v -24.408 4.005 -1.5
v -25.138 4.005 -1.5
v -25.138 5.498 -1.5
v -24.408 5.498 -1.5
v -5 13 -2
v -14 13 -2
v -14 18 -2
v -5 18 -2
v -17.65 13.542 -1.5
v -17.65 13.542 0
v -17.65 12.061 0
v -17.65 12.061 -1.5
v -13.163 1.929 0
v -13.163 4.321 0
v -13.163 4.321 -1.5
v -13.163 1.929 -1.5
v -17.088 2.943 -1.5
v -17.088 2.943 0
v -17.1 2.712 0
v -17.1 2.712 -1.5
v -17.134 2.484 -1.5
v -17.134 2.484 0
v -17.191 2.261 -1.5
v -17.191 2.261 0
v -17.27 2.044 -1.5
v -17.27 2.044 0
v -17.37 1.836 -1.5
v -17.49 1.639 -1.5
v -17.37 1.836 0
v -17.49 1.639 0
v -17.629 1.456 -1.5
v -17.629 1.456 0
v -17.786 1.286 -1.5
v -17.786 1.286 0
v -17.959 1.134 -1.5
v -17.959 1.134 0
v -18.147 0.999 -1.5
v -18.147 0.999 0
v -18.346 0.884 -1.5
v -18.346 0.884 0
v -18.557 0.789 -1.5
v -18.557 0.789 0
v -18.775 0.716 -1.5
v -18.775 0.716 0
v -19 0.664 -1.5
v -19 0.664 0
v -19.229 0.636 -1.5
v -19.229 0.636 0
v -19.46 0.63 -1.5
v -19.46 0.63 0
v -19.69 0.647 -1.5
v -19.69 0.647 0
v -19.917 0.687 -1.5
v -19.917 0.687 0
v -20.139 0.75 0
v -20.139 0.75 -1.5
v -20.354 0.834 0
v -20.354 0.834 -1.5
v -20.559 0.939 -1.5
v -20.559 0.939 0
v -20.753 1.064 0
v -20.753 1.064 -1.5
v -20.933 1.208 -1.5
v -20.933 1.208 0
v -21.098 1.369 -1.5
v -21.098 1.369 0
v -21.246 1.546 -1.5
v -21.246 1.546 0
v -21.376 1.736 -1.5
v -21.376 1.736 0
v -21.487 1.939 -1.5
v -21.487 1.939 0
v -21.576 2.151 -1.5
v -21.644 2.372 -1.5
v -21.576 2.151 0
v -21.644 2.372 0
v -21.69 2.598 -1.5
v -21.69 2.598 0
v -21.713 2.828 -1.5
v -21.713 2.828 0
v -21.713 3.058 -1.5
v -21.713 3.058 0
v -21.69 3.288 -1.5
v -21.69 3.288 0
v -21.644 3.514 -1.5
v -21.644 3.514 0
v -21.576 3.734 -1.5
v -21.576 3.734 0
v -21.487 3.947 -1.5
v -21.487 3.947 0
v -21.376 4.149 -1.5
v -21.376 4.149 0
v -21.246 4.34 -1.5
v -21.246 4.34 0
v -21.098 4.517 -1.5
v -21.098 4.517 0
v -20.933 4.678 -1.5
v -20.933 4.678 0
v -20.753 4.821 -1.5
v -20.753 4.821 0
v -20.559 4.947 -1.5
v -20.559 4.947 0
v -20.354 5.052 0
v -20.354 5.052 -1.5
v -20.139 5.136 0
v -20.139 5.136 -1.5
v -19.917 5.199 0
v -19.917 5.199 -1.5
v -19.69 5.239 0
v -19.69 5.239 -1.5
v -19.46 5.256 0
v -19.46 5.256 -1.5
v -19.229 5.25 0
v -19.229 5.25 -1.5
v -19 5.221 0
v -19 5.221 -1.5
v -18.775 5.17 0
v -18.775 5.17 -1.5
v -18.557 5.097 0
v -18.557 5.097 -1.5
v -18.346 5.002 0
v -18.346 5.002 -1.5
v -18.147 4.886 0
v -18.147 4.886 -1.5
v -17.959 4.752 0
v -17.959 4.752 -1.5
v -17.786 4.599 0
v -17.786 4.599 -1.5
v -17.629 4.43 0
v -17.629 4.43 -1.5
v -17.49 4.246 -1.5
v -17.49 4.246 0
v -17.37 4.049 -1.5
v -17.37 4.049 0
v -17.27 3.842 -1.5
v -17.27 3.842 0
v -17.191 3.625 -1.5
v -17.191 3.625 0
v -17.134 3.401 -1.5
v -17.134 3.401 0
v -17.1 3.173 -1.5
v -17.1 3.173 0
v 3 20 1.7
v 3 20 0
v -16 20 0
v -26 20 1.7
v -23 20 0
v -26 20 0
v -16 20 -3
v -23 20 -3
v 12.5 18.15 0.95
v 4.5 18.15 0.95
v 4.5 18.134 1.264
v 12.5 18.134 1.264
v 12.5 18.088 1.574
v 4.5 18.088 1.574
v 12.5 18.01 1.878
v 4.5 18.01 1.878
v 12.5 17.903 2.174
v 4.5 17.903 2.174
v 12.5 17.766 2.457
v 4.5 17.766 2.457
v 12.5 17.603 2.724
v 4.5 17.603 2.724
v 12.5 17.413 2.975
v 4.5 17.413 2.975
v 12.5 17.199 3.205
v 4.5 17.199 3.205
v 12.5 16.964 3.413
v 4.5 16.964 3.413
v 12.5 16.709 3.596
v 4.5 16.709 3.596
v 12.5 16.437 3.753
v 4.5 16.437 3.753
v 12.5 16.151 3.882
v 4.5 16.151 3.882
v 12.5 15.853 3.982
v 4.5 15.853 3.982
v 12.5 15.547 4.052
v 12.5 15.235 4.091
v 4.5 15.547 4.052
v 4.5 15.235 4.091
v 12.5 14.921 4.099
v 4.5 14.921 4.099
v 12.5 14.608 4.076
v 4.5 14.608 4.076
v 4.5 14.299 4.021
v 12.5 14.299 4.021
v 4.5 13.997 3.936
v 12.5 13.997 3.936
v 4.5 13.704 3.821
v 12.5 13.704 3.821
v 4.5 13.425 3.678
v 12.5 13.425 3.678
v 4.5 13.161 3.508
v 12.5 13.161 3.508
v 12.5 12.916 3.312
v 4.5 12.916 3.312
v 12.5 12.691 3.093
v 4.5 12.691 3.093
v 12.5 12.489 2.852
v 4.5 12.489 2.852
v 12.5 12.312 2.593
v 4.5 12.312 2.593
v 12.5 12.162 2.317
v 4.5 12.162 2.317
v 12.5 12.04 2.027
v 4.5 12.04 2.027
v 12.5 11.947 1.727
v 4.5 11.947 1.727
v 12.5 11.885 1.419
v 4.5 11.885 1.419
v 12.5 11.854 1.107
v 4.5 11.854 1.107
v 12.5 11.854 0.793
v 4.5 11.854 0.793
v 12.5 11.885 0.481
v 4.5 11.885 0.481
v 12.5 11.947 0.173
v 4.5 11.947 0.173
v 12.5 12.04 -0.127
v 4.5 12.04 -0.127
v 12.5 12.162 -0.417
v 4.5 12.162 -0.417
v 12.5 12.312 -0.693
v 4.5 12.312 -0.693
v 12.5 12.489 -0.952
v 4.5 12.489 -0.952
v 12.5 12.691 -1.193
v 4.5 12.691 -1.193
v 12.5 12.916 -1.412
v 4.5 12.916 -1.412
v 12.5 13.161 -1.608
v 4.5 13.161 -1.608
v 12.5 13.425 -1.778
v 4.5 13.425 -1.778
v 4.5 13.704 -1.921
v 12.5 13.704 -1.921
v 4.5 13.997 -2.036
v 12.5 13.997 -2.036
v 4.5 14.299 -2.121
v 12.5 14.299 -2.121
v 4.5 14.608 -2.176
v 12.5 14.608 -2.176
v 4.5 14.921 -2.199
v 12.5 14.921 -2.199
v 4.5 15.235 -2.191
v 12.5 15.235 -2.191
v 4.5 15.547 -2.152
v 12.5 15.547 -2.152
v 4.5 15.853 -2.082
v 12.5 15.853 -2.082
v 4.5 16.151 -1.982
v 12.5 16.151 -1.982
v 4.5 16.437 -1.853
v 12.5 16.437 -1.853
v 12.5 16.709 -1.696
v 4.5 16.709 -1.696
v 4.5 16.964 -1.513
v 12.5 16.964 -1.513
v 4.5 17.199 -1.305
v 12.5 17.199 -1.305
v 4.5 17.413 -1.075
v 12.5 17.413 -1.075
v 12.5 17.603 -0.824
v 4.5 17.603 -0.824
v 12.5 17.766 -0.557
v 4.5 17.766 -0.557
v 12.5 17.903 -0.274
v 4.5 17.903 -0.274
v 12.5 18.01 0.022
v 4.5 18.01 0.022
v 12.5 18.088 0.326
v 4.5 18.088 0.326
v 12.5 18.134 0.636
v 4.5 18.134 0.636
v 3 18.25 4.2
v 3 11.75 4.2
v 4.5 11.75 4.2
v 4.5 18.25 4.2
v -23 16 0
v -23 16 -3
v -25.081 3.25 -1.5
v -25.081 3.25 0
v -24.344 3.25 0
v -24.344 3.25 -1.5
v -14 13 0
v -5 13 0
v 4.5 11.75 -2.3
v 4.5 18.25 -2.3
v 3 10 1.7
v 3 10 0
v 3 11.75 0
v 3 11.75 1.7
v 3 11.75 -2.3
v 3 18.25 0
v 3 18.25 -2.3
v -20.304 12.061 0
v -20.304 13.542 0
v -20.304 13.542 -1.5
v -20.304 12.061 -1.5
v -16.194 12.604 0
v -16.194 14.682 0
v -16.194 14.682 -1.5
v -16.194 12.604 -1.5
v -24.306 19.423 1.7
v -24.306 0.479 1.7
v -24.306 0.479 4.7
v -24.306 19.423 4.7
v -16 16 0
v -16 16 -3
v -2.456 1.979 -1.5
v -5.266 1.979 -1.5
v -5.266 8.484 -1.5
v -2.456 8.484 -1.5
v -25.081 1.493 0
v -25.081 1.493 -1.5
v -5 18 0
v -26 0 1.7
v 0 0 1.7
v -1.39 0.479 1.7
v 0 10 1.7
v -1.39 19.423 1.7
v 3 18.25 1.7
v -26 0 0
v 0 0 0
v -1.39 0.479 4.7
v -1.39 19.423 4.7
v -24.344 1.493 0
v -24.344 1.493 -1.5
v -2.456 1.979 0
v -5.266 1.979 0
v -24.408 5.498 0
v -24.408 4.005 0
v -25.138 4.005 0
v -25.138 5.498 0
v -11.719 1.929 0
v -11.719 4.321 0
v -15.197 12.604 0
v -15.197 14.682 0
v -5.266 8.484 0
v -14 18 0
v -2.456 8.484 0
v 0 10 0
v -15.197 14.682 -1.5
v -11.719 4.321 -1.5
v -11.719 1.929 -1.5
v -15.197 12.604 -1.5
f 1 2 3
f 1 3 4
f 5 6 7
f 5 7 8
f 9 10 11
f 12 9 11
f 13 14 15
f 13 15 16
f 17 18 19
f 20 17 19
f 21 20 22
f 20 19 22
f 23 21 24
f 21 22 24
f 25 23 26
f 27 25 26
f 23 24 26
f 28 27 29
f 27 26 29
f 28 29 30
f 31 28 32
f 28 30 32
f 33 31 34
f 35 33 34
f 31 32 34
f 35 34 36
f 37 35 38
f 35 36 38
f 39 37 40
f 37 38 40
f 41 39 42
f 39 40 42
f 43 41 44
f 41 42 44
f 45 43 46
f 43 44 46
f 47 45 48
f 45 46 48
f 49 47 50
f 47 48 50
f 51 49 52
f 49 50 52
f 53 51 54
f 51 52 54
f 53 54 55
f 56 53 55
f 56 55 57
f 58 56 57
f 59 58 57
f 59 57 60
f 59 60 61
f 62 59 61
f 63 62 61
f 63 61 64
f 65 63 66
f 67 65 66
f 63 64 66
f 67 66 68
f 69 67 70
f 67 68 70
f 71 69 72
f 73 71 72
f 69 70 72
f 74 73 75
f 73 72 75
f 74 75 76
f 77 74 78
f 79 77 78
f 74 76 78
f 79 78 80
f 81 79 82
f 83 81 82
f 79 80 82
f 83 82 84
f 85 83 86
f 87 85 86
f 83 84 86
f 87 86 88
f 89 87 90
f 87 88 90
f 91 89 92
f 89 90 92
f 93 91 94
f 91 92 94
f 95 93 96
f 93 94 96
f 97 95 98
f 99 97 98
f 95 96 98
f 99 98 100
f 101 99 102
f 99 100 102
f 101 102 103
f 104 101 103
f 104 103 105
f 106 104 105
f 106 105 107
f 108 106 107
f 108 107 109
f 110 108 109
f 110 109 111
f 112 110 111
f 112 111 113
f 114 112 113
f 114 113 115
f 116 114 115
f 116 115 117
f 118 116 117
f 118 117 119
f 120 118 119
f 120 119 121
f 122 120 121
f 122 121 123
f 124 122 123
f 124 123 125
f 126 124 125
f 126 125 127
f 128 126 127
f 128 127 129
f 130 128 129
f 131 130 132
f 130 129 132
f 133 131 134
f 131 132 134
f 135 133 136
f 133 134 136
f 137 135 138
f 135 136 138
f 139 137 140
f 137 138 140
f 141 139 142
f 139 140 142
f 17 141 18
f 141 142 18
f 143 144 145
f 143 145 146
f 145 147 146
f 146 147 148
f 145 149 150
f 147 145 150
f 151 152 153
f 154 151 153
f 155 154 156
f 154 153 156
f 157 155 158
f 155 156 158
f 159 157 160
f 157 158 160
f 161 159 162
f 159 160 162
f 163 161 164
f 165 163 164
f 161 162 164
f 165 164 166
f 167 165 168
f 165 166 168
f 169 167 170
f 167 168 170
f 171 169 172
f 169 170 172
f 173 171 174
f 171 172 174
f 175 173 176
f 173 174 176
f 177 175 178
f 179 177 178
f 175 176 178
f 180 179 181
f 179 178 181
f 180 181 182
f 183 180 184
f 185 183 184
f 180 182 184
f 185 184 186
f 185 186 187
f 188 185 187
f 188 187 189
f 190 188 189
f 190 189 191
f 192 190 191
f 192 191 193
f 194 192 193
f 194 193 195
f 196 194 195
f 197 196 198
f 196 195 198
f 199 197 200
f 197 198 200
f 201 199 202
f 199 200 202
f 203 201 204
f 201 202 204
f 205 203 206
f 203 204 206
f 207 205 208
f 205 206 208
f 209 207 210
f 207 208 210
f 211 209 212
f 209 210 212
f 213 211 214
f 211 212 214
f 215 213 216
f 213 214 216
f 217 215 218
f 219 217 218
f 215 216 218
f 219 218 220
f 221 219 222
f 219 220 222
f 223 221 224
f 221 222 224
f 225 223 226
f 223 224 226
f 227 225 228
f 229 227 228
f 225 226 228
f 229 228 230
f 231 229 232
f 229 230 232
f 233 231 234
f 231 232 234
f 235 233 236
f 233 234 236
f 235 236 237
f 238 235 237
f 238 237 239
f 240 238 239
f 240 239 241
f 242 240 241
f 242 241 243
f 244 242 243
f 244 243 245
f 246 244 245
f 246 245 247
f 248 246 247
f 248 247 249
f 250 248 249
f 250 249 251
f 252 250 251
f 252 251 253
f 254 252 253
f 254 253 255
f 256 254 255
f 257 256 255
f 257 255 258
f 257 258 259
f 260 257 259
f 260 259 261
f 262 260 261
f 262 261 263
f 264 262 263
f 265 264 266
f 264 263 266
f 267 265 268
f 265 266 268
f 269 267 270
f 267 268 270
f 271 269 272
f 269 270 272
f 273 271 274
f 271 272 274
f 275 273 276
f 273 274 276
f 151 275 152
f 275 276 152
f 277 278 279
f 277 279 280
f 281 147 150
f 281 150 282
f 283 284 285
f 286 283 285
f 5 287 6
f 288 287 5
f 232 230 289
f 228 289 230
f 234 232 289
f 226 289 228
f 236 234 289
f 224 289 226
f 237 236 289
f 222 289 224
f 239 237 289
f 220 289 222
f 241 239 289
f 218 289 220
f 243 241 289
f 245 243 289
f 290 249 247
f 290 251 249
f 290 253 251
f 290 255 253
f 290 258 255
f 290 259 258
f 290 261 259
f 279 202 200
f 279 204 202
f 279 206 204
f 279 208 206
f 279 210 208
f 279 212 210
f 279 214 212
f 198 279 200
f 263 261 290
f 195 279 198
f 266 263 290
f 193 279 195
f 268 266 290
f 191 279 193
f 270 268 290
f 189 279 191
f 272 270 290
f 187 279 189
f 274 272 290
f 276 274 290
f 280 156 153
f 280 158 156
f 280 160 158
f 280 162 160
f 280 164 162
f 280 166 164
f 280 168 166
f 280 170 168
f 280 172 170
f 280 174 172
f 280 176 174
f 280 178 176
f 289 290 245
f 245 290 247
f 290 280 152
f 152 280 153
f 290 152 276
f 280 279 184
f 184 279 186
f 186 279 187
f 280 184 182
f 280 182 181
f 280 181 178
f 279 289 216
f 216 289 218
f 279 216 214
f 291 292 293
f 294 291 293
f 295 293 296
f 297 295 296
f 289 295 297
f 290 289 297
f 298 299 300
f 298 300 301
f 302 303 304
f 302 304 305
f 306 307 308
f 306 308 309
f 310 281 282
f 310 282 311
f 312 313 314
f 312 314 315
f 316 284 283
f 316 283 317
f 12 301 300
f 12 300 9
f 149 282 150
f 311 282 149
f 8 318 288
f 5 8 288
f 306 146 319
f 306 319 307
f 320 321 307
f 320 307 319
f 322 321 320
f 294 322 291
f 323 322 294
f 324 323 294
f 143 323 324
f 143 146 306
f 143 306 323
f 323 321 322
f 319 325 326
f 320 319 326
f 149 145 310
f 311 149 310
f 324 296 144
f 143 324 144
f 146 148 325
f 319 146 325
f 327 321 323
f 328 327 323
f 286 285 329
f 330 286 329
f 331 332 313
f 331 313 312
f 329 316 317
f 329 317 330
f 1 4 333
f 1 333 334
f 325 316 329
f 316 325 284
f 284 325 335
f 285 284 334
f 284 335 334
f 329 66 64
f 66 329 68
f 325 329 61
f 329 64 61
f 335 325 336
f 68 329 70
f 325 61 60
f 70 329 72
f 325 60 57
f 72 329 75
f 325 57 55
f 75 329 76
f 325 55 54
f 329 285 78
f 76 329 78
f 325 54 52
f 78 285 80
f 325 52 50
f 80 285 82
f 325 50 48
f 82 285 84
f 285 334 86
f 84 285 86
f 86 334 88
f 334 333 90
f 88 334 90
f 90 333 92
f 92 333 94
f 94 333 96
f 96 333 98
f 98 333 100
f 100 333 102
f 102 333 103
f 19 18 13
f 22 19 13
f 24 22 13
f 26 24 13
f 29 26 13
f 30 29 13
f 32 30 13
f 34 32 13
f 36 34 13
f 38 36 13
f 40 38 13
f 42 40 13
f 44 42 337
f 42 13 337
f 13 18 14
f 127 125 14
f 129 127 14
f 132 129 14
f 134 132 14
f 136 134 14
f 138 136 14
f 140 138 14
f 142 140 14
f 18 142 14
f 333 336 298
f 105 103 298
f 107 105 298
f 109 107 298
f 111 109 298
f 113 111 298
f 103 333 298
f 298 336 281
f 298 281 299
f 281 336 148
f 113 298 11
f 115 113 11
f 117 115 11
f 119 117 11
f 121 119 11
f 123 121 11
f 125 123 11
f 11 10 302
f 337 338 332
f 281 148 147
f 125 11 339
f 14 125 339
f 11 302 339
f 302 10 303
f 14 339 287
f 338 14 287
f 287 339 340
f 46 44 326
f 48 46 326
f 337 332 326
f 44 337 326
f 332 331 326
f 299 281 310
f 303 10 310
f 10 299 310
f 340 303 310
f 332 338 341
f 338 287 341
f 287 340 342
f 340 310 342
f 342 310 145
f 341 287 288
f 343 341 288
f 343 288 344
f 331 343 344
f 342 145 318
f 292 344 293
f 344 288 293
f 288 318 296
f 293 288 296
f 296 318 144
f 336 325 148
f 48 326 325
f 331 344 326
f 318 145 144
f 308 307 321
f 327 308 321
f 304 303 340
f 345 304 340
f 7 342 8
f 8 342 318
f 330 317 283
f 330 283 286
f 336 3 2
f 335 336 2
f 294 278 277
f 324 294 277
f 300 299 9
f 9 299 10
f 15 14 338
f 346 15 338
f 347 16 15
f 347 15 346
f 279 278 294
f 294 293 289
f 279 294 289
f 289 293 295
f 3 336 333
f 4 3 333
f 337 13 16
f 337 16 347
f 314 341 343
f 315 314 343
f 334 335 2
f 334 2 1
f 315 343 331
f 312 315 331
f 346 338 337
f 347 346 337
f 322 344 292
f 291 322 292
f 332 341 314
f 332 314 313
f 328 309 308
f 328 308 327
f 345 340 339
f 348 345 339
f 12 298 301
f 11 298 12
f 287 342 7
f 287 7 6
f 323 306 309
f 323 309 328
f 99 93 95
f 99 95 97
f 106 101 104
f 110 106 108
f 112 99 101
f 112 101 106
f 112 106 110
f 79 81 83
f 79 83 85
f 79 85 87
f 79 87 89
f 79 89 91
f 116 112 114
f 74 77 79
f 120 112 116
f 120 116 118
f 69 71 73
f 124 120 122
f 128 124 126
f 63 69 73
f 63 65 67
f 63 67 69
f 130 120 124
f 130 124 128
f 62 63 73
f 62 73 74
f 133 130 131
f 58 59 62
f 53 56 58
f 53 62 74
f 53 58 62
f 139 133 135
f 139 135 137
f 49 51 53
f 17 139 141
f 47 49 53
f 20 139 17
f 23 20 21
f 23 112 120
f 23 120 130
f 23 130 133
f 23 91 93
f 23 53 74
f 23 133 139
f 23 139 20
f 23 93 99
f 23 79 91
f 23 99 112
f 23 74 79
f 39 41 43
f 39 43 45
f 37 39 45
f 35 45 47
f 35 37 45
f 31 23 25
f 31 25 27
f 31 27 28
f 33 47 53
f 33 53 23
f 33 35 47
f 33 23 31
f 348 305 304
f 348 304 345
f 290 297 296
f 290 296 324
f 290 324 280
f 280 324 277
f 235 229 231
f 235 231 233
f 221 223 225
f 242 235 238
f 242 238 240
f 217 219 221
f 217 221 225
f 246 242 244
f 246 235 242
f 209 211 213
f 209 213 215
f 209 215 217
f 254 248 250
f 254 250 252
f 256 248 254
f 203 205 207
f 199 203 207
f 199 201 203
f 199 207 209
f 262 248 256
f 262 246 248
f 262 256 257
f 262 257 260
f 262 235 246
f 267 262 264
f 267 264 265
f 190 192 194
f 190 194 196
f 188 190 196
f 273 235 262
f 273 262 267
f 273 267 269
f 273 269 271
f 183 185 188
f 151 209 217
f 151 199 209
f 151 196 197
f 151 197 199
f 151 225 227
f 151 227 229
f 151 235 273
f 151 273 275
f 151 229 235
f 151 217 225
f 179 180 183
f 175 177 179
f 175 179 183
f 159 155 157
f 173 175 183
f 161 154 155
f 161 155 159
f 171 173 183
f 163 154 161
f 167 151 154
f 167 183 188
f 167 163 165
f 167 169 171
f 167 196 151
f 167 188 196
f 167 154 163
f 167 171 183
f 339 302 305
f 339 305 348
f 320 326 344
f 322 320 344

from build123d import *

# Parameters (mm, degrees)
F1_DEPTH  = 1.7
F2_W      = 22.915563779
F2_H      = 18.9440016984
F3_DEPTH  = 3
F4_W      = 9
F4_H      = 5
F5_DEPTH  = 2
F6_W      = 2.8090730775
F6_H      = 6.5048590768
F6_W_2    = 0.9965691715
F6_H_2    = 2.0780880004
F6_W_3    = 2.6543419808
F6_H_3    = 1.4811633155
F6_W_4    = 1.4437921345
F6_H_4    = 2.3924442939
F6_W_5    = 0.7371641695
F6_H_5    = 1.757067279
F6_W_6    = 0.7299780846
F6_H_6    = 1.4931405894
F6_R      = 2.3137841174
F7_DEPTH  = 1.5
F8_W      = 7
F8_H      = 4
F9_DEPTH  = 3
F10_W     = 6.5
F10_H     = 2.3
F10_H_2   = 1.7
F10_H_3   = 2.5
F11_DEPTH = 1.5
F12_R     = 3.15
F13_DEPTH = 8


with BuildPart() as f1:
    # F0 (on Top) → F1 (new body)
    with BuildSketch(Plane.XY):
        Polygon((-26, 20), (-26, 0), (0, 0), (0, 10), (3, 10), (3, 20), align=None)
    extrude(amount=F1_DEPTH)

    # F2 (on face) → F3 (join)
    with BuildSketch(Plane.XY.offset(1.7)):
        with Locations((-12.8477554535, 9.9514690519)):
            Rectangle(F2_W, F2_H)
    extrude(amount=F3_DEPTH)

    # F4 (on face) → F5 (join)
    with BuildSketch(Plane(origin=(0, 0, 0), x_dir=(1, 0, 0), z_dir=(0, 0, -1))):
        with Locations((-9.5, -15.5)):
            Rectangle(F4_W, F4_H)
    extrude(amount=F5_DEPTH)

    # F6 (on face) → F7 (join)
    with BuildSketch(Plane(origin=(0, 0, 0), x_dir=(1, 0, 0), z_dir=(0, 0, -1))):
        with Locations((-3.8609959884, -5.2312271437)):
            Rectangle(F6_W, F6_H)
        with Locations((-15.6953232363, -13.6427599937)):
            Rectangle(F6_W_2, F6_H_2)
        with Locations((-18.9768830314, -12.8015675582)):
            Rectangle(F6_W_3, F6_H_3)
        with Locations((-12.4409804121, -3.1250810716)):
            Rectangle(F6_W_4, F6_H_4)
        with Locations((-24.7127972543, -2.3718061275)):
            Rectangle(F6_W_5, F6_H_5)
        with Locations((-24.7733462602, -4.7515959013)):
            Rectangle(F6_W_6, F6_H_6)
        with Locations((-19.4019284099, -2.9428394046)):
            Circle(F6_R)
    extrude(amount=F7_DEPTH)

    # F8 (on face) → F9 (join)
    with BuildSketch(Plane(origin=(0, 0, 0), x_dir=(1, 0, 0), z_dir=(0, 0, -1))):
        with Locations((-19.5, -18)):
            Rectangle(F8_W, F8_H)
    extrude(amount=F9_DEPTH)

    # F10 (on face) → F11 (join)
    with BuildSketch(Plane.YZ.offset(3)):
        with Locations((15, -1.15)):
            Rectangle(F10_W, F10_H)
        with Locations((15, 0.85)):
            Rectangle(F10_W, F10_H_2)
        with Locations((15, 2.95)):
            Rectangle(F10_W, F10_H_3)
    extrude(amount=F11_DEPTH)

    # F12 (on face) → F13 (join)
    with BuildSketch(Plane.YZ.offset(4.5)):
        with Locations((15, 0.95)):
            Circle(F12_R)
    extrude(amount=F13_DEPTH)


solid = f1.part
